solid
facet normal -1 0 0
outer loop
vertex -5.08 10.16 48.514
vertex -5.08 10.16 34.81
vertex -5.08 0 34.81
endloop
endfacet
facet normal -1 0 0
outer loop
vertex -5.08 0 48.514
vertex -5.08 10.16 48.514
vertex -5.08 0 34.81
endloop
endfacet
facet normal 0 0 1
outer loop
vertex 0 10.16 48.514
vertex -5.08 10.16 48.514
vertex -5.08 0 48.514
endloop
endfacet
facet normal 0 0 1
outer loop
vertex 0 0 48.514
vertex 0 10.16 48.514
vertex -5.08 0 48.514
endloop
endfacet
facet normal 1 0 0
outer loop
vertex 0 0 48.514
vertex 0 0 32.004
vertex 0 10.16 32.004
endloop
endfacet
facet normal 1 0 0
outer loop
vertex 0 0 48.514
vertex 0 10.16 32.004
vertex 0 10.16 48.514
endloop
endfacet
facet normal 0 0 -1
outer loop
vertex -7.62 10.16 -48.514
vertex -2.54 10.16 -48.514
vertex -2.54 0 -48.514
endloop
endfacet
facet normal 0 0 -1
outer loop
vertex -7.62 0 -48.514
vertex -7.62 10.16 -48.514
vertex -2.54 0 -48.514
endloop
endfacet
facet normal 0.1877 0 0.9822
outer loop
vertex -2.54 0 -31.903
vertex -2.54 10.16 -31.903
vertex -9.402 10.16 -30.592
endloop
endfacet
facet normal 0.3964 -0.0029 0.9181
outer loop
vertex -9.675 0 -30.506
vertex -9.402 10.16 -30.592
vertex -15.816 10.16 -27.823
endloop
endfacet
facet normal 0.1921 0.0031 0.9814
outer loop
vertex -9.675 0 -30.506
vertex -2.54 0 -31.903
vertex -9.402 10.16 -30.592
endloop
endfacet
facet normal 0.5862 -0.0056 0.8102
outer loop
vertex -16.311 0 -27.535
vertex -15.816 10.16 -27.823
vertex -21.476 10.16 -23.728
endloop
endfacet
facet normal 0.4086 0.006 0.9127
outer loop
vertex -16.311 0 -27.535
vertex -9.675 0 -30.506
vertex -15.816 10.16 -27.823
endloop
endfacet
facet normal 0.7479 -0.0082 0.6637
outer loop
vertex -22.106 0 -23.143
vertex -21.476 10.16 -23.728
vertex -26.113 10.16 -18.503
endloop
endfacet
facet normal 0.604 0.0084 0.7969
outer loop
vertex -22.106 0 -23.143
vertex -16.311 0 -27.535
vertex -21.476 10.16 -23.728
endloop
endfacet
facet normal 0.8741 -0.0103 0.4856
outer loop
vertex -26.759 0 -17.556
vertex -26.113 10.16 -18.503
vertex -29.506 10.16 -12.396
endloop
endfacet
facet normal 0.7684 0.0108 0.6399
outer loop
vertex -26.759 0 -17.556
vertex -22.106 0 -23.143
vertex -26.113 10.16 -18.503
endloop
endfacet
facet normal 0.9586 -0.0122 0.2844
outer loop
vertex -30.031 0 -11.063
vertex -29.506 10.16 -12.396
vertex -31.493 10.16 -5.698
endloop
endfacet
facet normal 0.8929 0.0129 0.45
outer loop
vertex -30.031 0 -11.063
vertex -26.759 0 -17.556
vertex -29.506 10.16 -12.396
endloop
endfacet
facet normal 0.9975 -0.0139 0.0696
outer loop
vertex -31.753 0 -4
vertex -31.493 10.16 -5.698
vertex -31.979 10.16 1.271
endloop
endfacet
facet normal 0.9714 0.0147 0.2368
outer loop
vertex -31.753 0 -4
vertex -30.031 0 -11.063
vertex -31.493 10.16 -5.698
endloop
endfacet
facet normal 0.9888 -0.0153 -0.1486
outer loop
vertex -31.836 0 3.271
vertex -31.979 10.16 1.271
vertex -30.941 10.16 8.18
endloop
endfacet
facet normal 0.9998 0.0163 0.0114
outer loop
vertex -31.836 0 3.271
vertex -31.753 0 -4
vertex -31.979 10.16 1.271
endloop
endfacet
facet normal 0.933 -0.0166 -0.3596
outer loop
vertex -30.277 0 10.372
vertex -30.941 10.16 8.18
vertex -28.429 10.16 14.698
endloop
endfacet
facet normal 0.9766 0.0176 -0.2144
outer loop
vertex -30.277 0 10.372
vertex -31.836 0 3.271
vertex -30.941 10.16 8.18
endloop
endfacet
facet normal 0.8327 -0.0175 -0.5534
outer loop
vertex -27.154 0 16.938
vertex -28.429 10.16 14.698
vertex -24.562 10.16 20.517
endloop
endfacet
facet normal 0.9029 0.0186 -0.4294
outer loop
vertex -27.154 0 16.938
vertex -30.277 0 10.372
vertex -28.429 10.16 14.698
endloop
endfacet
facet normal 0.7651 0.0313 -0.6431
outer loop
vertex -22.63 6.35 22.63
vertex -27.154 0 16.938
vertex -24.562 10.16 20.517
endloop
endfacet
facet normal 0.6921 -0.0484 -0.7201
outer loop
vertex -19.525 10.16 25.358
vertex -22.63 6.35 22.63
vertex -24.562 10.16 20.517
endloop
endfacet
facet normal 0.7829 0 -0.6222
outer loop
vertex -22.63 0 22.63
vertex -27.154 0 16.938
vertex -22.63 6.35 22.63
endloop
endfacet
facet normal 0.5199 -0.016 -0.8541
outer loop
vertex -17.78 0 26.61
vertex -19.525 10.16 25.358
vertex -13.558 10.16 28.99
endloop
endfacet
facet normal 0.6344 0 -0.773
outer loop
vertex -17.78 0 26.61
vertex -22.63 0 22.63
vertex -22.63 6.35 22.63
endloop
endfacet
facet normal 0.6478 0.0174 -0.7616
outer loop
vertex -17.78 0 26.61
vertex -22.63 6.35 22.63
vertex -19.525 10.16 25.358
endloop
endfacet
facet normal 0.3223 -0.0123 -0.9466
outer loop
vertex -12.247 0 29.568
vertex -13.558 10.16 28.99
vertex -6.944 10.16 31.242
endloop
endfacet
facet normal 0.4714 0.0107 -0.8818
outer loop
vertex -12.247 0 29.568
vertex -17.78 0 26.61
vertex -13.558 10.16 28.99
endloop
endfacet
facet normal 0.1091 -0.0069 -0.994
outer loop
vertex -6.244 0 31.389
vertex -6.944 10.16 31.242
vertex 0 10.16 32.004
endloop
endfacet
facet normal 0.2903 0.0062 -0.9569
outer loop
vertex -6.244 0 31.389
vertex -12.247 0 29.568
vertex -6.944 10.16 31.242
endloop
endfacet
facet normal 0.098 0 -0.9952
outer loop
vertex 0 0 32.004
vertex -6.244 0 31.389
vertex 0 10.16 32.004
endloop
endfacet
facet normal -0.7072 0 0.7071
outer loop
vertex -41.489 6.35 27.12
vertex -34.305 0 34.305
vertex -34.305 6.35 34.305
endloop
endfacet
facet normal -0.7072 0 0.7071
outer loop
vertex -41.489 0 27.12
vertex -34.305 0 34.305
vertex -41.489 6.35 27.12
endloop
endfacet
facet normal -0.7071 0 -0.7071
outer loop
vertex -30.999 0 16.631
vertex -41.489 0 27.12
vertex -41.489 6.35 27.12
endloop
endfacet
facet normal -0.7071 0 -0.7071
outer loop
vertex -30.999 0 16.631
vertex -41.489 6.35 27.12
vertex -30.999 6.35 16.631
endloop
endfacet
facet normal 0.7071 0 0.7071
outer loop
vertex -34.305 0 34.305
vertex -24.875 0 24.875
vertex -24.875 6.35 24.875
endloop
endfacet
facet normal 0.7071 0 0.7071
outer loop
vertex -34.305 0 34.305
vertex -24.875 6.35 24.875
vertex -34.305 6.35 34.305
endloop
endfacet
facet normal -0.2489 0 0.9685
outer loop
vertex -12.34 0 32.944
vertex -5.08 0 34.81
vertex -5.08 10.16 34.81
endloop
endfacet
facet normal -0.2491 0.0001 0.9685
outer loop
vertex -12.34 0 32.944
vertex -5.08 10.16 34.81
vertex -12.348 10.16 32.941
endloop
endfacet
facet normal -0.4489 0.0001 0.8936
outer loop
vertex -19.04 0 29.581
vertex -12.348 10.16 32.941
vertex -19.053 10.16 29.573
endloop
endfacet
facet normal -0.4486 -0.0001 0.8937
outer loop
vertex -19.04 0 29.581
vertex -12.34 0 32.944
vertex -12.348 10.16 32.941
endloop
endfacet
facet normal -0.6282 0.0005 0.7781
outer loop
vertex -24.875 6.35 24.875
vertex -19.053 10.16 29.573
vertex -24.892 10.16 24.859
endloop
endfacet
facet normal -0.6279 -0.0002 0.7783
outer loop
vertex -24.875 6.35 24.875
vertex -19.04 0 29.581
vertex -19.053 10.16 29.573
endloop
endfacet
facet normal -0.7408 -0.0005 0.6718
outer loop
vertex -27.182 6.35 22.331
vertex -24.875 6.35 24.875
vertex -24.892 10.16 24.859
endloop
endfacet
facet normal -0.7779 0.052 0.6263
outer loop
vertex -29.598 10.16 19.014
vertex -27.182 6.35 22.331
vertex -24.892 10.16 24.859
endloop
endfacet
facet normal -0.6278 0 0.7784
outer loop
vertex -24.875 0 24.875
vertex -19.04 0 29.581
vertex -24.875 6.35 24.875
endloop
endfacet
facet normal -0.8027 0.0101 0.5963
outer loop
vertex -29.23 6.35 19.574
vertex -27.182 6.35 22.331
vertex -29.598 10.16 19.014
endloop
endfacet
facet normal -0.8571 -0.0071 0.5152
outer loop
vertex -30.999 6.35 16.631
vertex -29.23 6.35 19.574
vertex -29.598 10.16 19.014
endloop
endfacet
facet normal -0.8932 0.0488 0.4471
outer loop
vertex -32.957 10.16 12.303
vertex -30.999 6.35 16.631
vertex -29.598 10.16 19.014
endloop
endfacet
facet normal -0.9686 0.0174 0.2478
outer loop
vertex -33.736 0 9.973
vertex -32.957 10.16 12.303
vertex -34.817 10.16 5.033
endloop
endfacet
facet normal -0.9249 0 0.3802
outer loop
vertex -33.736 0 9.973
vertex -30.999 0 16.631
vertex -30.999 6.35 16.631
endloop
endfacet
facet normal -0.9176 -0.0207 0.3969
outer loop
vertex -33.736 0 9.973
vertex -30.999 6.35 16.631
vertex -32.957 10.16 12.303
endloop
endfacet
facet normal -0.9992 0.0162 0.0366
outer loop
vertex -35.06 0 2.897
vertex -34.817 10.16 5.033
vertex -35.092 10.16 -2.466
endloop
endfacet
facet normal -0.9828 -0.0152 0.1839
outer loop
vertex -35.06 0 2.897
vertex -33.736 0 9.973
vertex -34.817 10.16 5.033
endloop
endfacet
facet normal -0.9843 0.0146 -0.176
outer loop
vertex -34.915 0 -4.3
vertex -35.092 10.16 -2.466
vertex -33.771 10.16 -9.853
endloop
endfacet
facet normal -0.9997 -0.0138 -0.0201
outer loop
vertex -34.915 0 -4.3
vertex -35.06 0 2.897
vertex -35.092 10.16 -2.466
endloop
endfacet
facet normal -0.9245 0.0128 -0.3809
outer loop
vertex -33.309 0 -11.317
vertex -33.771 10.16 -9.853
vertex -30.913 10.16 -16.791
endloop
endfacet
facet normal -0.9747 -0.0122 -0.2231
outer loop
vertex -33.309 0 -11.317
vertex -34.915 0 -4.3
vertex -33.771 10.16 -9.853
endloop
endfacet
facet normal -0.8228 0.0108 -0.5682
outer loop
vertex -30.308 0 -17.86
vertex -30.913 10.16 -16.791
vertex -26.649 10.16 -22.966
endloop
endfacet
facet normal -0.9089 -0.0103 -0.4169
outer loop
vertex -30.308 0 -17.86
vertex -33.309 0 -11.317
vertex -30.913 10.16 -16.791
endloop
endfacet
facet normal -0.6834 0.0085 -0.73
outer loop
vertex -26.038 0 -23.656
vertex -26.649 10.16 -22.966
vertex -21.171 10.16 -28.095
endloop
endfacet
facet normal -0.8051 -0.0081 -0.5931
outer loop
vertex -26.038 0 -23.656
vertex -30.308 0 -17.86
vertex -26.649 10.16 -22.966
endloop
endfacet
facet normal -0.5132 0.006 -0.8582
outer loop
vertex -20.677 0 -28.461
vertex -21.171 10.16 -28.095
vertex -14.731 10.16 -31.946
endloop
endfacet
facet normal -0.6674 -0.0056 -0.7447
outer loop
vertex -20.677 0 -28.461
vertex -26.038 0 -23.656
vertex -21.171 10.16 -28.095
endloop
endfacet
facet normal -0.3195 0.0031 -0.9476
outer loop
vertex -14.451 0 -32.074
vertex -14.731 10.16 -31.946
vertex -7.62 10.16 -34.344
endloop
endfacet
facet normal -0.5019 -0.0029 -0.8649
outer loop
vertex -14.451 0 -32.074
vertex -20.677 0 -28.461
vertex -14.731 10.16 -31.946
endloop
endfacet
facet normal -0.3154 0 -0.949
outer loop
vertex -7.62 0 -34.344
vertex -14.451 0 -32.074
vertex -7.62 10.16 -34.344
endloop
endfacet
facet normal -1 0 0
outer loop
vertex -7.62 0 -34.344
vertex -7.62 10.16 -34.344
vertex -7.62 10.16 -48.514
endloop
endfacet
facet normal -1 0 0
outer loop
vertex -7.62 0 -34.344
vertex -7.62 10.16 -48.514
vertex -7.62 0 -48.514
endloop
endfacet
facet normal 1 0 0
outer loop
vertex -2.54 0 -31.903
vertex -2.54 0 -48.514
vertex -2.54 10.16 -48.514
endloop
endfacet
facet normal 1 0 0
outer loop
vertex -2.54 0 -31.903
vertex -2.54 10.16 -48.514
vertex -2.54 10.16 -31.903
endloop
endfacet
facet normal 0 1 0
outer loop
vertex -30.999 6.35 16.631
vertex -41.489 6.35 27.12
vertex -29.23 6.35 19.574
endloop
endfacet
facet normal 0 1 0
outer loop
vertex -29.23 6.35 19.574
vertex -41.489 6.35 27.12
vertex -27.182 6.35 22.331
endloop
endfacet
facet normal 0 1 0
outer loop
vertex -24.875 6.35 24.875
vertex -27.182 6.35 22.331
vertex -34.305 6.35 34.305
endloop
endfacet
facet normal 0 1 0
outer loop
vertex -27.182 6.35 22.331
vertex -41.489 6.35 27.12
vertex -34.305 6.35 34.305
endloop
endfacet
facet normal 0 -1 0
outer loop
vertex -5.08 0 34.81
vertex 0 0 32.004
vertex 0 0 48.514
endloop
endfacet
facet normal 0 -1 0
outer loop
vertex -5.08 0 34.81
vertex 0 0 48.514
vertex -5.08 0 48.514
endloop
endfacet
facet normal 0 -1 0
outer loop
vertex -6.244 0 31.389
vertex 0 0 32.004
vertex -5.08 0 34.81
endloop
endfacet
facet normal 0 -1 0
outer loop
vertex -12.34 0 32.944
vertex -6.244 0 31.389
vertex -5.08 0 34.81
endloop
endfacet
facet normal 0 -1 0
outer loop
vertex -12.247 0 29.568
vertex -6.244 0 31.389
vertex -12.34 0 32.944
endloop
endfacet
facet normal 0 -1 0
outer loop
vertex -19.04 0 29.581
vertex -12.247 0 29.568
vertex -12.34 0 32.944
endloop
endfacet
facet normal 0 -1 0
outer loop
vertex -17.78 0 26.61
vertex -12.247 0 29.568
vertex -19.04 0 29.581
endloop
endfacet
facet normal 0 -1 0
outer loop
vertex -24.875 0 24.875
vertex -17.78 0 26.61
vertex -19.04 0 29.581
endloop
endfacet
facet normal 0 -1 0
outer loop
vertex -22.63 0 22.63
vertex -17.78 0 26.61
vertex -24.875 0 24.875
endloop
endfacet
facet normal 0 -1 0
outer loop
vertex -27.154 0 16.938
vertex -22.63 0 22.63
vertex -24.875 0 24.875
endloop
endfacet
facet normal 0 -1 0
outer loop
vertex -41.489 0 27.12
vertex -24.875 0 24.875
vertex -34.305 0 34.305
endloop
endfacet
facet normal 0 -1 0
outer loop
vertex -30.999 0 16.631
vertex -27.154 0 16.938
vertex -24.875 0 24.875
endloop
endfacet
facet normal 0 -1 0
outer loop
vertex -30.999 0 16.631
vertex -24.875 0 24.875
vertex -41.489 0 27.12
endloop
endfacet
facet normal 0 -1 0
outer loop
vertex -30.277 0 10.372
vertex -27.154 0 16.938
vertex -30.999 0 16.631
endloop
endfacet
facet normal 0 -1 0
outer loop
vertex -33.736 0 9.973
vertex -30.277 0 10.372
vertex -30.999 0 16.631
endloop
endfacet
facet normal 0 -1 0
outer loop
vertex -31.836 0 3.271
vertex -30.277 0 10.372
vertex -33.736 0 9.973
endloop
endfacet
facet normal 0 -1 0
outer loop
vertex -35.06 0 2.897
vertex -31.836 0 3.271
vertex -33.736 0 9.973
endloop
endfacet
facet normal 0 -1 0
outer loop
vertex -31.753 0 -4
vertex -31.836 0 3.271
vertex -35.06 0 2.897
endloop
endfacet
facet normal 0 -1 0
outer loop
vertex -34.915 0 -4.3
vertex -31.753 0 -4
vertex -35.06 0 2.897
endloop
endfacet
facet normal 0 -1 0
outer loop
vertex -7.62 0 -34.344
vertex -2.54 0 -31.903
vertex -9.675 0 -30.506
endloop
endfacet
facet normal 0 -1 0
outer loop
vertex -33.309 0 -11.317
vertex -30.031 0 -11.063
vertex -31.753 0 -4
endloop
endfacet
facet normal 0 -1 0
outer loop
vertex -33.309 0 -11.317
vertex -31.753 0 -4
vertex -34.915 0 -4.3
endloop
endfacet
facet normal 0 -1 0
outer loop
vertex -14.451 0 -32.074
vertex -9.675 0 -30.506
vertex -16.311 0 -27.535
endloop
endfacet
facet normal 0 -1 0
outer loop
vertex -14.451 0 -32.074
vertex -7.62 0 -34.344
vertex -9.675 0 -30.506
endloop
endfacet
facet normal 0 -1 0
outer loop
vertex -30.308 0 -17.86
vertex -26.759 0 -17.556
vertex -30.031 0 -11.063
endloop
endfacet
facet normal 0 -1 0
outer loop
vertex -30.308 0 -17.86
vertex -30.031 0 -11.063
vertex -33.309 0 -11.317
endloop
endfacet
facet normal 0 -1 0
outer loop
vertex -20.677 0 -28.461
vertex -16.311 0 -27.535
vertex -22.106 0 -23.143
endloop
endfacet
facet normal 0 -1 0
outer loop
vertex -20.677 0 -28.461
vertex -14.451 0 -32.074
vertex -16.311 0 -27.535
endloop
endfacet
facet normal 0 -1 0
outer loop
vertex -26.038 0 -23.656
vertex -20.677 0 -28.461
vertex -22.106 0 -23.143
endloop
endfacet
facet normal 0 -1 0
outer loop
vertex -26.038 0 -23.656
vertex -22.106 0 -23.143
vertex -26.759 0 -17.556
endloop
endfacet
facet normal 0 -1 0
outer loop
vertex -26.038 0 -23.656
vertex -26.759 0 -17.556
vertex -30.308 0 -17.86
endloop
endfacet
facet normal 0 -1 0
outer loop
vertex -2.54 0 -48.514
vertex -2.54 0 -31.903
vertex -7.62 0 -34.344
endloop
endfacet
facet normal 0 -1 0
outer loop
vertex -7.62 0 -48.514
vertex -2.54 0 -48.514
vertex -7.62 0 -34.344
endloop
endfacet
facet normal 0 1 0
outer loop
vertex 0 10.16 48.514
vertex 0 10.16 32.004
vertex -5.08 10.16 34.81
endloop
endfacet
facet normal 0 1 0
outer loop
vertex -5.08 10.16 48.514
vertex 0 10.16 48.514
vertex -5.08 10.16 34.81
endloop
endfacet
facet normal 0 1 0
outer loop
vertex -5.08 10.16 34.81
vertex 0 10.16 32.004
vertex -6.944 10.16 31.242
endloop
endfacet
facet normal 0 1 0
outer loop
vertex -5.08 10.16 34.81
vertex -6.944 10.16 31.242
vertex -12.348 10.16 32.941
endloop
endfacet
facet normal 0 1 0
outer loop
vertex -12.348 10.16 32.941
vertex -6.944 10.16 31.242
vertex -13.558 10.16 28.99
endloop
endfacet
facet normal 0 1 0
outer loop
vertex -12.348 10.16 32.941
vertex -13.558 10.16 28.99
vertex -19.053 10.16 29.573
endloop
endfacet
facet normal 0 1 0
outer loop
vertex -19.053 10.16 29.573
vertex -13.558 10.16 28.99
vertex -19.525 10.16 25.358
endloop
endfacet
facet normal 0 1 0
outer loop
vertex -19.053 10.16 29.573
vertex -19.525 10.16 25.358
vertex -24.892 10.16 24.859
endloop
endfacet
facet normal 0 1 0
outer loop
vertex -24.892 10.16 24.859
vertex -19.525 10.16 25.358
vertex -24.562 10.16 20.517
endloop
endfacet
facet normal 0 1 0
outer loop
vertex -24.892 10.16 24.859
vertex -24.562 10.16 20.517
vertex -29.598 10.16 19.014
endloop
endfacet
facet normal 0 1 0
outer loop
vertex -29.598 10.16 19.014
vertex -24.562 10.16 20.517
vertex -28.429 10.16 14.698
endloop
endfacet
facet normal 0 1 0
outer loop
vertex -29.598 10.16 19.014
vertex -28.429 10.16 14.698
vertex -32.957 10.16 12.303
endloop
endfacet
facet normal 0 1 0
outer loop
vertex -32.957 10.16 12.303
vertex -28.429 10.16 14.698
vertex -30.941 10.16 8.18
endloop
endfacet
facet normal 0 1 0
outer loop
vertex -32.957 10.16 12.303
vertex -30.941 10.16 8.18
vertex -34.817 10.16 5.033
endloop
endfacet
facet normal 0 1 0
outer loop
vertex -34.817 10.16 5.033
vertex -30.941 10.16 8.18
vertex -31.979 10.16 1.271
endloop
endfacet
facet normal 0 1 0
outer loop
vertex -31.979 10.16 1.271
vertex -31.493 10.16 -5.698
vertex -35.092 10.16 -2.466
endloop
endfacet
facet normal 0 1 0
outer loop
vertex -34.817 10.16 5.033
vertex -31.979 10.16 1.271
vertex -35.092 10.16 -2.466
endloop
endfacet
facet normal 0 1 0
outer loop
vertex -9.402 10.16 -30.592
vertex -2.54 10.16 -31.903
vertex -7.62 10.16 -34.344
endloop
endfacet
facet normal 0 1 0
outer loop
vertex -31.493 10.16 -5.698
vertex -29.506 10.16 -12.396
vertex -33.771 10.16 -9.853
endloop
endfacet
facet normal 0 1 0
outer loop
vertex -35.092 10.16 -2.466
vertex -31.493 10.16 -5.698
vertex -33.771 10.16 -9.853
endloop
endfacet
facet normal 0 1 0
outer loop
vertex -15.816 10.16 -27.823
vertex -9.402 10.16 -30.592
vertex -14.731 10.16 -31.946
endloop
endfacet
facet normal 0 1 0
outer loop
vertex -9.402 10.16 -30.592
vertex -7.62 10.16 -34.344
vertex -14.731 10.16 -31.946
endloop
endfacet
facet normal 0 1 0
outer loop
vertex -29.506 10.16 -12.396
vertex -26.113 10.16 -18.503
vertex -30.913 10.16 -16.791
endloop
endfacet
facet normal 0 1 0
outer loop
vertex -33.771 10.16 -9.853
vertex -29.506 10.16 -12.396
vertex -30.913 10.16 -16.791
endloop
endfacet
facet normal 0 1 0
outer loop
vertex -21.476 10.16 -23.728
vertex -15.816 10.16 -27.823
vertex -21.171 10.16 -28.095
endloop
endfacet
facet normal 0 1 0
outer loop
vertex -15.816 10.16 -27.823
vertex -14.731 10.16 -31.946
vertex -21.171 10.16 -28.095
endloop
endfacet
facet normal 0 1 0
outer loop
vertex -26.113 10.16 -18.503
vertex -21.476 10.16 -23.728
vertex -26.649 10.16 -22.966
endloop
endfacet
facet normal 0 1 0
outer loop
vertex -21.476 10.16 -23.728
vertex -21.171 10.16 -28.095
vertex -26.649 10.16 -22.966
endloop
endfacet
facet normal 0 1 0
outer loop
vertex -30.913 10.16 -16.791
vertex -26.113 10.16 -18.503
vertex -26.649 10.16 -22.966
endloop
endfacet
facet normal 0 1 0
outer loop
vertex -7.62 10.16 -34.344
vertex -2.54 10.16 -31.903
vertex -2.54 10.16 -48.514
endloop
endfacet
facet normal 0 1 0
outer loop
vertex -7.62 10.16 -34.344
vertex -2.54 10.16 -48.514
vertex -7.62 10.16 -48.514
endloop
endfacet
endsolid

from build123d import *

# Parameters (mm, degrees)
BOSS_EXTRUDE1_DEPTH = 10.16
SKETCH3_W           = 10.16
SKETCH3_H           = 5.08
BOSS_EXTRUDE2_DEPTH = 16.51
SKETCH4_W           = 10.16
SKETCH4_H           = 5.08
BOSS_EXTRUDE3_DEPTH = 16.51
BOSS_EXTRUDE5_DEPTH = 6.35


with BuildPart() as part:
    # Sketch1 → Boss-Extrude1 (new body)
    with BuildSketch(Plane(origin=(0, 0, 0), x_dir=(1, 0, 0), z_dir=(0, 1, 0))):
        with BuildLine():
            Line((0, -32.004), (0, -35.179))
            ThreePointArc((0, -35.179), (-35.156038364, -1.270829481), (-2.54, 35.087183429))
            Line((-2.54, 35.087183429), (-2.54, 31.903047127))
            ThreePointArc((-2.54, 31.903047127), (-31.978751823, -1.271002703), (0, -32.004))
        make_face()
    extrude(amount=BOSS_EXTRUDE1_DEPTH)

    # Sketch3 → Boss-Extrude2 (add)
    with BuildSketch(Plane(origin=(0, 0, 32.004), x_dir=(0, -1, 0), z_dir=(0, 0, -1))):
        with Locations((-5.08, 2.54)):
            Rectangle(SKETCH3_W, SKETCH3_H)
    extrude(amount=-BOSS_EXTRUDE2_DEPTH)

    # Sketch4 → Boss-Extrude3 (add)
    with BuildSketch(Plane(origin=(0, 0, -32.004), x_dir=(0, -1, 0), z_dir=(0, 0, 1))):
        with Locations((-5.08, -5.08)):
            Rectangle(SKETCH4_W, SKETCH4_H)
    extrude(amount=-BOSS_EXTRUDE3_DEPTH)

    # Sketch6 → Boss-Extrude5 (add)
    with BuildSketch(Plane.XZ):
        Polygon((-22.630245425, 22.630245425), (-34.304578382, 34.304578382), (-41.488783279, 27.120373486), (-29.814450322, 15.446040528), align=None)
    extrude(amount=-BOSS_EXTRUDE5_DEPTH)


solid = part.part
